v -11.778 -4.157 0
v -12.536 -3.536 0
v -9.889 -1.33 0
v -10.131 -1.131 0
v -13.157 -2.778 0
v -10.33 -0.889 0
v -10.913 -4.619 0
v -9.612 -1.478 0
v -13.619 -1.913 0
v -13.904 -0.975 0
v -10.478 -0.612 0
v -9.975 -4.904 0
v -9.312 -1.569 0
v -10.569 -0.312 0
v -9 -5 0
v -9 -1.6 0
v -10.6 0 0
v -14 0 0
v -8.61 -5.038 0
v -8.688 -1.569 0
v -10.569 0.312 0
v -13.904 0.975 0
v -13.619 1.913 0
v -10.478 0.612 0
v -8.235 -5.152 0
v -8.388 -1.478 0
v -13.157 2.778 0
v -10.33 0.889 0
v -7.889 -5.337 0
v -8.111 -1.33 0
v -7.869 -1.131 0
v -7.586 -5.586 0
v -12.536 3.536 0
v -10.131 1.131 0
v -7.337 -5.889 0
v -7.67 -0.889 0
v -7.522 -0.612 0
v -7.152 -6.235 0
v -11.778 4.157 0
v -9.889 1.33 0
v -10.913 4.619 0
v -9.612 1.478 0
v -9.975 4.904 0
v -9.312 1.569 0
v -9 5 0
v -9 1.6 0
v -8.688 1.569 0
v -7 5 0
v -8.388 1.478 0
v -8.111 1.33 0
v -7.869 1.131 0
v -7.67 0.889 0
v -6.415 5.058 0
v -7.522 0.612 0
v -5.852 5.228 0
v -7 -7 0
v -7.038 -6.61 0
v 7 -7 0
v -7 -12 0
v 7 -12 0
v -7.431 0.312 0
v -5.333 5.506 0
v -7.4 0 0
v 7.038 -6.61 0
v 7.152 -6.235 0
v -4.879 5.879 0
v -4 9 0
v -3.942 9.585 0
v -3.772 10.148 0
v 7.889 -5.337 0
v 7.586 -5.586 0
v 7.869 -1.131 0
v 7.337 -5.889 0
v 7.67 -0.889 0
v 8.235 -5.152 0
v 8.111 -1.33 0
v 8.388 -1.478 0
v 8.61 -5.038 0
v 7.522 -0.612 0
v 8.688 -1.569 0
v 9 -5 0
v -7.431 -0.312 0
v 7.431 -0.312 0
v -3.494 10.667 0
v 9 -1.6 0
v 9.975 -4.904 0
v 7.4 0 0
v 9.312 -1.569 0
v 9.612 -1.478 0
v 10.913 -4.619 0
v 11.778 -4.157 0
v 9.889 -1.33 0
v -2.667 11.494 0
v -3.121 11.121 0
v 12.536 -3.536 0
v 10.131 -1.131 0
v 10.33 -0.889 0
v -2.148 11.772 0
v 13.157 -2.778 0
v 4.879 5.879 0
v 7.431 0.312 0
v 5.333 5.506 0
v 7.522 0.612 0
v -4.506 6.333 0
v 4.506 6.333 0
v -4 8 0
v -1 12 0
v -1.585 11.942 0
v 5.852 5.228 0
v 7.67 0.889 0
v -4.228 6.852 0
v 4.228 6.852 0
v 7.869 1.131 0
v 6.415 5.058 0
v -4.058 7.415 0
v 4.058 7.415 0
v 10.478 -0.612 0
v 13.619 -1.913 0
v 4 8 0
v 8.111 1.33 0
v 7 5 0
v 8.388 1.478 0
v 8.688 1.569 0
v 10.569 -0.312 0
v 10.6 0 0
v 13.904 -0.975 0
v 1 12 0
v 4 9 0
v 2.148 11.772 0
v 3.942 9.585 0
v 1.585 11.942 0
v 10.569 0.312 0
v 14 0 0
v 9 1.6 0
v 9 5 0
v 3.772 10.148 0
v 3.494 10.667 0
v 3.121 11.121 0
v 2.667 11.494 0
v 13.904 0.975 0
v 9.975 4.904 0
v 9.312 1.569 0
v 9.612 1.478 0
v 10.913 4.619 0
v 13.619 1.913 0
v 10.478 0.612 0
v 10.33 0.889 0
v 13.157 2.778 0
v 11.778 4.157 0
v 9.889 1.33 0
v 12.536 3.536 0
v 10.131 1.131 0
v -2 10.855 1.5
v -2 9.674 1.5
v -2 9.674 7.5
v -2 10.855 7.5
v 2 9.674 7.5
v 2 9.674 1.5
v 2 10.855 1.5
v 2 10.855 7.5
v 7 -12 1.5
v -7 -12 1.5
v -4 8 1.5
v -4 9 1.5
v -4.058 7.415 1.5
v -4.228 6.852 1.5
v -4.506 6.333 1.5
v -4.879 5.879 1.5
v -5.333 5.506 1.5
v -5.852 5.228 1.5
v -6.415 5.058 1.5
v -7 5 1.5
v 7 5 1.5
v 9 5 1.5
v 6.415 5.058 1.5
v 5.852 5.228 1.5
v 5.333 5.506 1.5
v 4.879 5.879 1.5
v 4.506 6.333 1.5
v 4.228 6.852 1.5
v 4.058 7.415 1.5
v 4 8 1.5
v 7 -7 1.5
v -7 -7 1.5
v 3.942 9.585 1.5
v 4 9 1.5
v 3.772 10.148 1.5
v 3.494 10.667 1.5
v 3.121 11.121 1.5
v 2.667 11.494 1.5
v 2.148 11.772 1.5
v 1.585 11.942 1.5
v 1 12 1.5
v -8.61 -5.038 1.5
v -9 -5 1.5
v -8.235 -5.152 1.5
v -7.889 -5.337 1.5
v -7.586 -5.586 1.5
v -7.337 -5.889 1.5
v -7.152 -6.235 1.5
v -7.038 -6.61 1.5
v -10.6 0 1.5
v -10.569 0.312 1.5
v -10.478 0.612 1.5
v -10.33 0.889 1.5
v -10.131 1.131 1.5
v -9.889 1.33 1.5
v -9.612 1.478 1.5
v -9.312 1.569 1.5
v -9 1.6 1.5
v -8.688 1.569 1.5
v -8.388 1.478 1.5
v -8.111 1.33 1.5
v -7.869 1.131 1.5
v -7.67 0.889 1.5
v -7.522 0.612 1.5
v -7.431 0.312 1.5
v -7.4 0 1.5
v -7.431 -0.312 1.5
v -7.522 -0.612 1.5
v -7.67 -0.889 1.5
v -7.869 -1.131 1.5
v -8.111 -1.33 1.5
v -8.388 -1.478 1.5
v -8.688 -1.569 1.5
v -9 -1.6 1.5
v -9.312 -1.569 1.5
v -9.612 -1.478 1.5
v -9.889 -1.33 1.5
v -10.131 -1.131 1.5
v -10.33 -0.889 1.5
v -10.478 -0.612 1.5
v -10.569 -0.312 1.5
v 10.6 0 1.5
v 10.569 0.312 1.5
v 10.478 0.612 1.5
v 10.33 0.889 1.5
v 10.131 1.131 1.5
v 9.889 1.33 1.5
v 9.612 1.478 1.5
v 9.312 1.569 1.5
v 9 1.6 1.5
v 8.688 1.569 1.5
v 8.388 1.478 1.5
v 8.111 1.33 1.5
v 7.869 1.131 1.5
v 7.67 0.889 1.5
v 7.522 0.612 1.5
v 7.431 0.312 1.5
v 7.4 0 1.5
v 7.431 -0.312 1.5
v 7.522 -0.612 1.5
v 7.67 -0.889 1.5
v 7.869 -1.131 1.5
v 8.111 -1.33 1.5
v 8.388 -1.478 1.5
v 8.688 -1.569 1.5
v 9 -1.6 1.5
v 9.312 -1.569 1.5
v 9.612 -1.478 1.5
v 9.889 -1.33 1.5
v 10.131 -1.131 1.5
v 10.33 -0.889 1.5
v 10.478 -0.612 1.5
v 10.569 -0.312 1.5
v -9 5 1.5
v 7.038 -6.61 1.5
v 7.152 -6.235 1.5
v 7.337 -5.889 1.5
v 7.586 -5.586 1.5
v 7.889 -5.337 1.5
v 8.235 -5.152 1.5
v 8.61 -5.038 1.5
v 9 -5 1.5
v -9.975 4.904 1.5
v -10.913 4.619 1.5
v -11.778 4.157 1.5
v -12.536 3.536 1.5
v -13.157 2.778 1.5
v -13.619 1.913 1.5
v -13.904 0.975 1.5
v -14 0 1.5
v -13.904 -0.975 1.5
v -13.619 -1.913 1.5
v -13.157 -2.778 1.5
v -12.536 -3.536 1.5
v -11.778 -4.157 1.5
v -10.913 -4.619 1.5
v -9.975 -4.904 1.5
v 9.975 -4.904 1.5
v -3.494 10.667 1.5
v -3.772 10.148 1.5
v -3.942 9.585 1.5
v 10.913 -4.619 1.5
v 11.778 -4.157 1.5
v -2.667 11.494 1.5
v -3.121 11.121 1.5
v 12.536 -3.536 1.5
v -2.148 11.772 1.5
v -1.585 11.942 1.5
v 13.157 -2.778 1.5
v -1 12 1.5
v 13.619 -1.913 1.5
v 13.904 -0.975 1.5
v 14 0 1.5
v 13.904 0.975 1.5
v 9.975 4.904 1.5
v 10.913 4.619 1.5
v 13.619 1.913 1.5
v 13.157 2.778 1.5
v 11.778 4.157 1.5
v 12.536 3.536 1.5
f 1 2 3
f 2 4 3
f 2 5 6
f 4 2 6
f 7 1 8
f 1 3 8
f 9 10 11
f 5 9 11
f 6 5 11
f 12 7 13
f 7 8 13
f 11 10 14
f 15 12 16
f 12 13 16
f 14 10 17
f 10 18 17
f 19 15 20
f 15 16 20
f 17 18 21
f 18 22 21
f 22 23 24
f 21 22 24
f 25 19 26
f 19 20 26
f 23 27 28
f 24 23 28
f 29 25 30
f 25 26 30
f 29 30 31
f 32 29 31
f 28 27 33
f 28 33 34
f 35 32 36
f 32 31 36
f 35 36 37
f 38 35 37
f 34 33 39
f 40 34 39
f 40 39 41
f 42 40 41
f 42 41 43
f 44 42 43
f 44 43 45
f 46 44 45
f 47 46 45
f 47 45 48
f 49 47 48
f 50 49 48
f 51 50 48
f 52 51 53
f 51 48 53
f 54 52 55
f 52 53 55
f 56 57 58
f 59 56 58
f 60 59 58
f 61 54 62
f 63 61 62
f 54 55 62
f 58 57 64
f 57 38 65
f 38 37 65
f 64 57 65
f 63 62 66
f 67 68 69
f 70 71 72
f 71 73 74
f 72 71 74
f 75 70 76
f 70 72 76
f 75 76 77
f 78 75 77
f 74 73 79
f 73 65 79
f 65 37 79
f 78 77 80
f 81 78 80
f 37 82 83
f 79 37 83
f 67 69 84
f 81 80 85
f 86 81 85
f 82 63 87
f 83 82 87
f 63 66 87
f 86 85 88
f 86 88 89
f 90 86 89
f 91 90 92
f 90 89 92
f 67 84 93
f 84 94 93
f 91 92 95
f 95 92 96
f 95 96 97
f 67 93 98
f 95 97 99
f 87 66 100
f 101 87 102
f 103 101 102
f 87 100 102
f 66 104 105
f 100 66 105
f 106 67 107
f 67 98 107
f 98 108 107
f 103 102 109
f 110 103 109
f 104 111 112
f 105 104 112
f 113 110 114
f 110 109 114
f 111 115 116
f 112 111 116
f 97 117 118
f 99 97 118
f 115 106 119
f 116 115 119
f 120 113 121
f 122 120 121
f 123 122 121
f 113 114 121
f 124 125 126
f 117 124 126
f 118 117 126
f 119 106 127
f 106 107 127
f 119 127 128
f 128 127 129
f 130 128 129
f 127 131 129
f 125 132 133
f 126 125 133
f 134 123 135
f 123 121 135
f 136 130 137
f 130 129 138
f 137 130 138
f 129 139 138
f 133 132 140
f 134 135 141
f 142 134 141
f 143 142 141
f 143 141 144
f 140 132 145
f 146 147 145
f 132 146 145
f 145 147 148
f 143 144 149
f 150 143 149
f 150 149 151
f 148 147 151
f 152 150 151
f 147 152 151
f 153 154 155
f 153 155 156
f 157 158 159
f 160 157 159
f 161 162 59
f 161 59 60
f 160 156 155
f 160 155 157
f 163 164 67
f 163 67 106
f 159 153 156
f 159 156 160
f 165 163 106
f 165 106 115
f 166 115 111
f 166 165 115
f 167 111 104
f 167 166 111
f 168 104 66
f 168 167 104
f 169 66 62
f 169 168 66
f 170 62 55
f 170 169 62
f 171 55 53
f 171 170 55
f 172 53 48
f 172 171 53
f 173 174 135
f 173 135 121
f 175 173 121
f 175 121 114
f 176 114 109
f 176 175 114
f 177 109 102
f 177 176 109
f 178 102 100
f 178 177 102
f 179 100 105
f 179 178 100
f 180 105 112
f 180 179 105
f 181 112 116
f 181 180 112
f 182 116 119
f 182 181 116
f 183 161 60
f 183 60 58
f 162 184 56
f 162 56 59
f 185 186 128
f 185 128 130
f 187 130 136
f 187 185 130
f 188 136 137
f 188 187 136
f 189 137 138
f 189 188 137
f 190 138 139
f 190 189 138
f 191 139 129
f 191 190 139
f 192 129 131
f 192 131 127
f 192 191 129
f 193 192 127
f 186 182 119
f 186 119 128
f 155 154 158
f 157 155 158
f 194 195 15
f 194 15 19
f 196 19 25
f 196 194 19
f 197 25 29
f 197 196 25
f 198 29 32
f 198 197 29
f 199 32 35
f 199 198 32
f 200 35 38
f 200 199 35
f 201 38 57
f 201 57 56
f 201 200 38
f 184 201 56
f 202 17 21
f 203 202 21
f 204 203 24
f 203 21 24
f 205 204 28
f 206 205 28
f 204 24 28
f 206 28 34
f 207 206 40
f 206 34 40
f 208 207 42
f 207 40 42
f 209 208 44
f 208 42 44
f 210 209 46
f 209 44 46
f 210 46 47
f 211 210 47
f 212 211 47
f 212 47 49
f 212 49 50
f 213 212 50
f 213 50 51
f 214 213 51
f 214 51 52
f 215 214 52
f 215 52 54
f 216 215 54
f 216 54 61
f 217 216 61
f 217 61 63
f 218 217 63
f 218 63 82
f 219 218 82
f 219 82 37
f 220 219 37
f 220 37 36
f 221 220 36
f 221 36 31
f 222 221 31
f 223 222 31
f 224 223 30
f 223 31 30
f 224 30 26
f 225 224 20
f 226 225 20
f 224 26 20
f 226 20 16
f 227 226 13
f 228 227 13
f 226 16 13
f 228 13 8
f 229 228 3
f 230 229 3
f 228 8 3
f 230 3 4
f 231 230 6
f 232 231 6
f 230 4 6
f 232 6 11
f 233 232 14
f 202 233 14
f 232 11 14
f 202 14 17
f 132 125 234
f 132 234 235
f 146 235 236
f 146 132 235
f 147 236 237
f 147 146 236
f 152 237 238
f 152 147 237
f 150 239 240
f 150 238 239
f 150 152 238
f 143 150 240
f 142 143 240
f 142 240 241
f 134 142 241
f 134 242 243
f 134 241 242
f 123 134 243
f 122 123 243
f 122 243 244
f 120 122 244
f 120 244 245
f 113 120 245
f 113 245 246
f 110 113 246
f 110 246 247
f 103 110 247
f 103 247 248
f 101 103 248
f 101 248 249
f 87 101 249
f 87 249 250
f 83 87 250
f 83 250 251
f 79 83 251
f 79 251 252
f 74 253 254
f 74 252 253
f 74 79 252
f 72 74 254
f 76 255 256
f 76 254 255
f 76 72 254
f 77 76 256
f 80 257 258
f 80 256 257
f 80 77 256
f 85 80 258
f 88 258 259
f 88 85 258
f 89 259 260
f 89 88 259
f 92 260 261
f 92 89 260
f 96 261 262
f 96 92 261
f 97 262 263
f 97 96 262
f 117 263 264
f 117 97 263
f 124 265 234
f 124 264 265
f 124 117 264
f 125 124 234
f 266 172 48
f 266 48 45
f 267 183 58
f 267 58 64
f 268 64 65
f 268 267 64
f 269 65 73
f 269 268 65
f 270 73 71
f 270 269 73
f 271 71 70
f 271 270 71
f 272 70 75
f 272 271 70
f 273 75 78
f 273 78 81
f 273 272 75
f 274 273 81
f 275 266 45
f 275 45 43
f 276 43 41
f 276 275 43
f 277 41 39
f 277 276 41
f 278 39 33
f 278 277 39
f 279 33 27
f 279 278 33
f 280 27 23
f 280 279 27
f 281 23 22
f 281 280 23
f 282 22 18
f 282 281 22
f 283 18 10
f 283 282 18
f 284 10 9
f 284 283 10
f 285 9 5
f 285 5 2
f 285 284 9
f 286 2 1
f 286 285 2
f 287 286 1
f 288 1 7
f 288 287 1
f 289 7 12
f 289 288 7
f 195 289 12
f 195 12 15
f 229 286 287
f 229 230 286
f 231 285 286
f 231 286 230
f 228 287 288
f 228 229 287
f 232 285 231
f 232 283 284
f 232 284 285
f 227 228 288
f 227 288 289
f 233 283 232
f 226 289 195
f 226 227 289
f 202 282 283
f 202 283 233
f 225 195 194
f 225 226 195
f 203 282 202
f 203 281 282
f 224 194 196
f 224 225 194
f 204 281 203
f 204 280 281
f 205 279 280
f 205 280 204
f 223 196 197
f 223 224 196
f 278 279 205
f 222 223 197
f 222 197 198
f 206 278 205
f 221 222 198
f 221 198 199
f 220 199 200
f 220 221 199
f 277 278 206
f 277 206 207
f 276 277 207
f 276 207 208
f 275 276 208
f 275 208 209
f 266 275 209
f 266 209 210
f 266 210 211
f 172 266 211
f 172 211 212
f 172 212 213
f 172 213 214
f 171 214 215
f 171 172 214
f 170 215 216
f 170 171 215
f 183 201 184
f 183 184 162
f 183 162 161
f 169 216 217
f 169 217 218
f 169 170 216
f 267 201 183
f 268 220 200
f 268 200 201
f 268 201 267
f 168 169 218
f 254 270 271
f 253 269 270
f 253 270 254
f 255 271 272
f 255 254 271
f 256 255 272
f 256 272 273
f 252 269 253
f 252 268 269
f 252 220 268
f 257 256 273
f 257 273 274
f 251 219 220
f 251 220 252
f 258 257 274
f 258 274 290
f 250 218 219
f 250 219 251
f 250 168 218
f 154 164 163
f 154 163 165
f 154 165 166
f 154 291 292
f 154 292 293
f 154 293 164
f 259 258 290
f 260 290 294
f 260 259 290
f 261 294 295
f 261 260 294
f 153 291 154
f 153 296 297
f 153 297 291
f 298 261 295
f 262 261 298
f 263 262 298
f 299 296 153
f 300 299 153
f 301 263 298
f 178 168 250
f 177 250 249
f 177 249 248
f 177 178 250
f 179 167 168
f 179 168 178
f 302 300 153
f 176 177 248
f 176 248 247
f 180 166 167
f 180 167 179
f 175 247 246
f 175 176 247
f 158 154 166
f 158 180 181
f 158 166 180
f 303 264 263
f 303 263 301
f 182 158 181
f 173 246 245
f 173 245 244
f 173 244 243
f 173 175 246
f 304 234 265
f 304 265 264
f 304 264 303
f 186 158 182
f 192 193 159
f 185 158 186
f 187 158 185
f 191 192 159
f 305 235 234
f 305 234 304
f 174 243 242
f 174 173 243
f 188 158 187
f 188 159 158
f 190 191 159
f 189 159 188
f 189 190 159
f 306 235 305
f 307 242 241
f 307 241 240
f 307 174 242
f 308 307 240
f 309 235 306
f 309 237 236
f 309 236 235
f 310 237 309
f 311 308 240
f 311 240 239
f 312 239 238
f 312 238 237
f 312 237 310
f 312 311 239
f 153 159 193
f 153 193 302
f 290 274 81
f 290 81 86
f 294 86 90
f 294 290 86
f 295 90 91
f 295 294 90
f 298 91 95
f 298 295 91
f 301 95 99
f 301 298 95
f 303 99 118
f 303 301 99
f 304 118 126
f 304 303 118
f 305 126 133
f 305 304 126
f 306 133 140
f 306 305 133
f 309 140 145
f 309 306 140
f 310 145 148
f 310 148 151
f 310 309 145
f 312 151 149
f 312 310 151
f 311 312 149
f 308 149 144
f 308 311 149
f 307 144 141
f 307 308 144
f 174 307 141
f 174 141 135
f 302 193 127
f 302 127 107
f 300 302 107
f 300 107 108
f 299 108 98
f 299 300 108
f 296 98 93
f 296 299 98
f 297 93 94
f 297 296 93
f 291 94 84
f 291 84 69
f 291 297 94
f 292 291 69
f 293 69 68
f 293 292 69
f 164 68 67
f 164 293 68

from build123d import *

# Parameters (mm, degrees)
BOSS_EXTRUDE1_DEPTH        = 1.5
F_3_2_3_2_DIAMETER_HOLE1_D = 3.2
SKETCH5_W                  = 4
SKETCH5_H                  = 1.181538701
BOSS_EXTRUDE2_DEPTH        = 6


with BuildPart() as part:
    # Sketch1 → Boss-Extrude1 (new body)
    with BuildSketch(Plane.XY.offset(1.5)):
        with BuildLine():
            Line((-4, 9), (-4, 8))
            ThreePointArc((-4, 8), (-4.878679656, 5.878679656), (-7, 5))
            Line((-7, 5), (-9, 5))
            ThreePointArc((-9, 5), (-14, 0), (-9, -5))
            ThreePointArc((-9, -5), (-7.585786438, -5.585786438), (-7, -7))
            Line((-7, -7), (-7, -12))
            Line((-7, -12), (7, -12))
            Line((7, -12), (7, -7))
            ThreePointArc((7, -7), (7.585786438, -5.585786438), (9, -5))
            ThreePointArc((9, -5), (14, 0), (9, 5))
            Line((9, 5), (7, 5))
            ThreePointArc((7, 5), (4.878679656, 5.878679656), (4, 8))
            Line((4, 8), (4, 9))
            ThreePointArc((4, 9), (3.121320344, 11.121320344), (1, 12))
            Line((1, 12), (-1, 12))
            ThreePointArc((-1, 12), (-3.121320344, 11.121320344), (-4, 9))
        make_face()
    extrude(amount=-BOSS_EXTRUDE1_DEPTH)

    # Ø3.2 (3.2) Diameter Hole1 (through all)
    with Locations(Plane.XY.offset(1.5)):
        with Locations((-9, 0)):
            f_3_2_3_2_diameter_hole1 = Hole(F_3_2_3_2_DIAMETER_HOLE1_D / 2)

    # Mirror1: Ø3.2 (3.2) Diameter Hole1 across plane
    add(f_3_2_3_2_diameter_hole1.mirror(Plane(origin=(0, 0, 0), x_dir=(0, 0, 1), z_dir=(1, 0, 0))), mode=Mode.SUBTRACT)

    # Sketch5 → Boss-Extrude2 (add)
    with BuildSketch(Plane.XY.offset(1.5)):
        with Locations((0, 10.264616907)):
            Rectangle(SKETCH5_W, SKETCH5_H)
    extrude(amount=BOSS_EXTRUDE2_DEPTH)


solid = part.part
